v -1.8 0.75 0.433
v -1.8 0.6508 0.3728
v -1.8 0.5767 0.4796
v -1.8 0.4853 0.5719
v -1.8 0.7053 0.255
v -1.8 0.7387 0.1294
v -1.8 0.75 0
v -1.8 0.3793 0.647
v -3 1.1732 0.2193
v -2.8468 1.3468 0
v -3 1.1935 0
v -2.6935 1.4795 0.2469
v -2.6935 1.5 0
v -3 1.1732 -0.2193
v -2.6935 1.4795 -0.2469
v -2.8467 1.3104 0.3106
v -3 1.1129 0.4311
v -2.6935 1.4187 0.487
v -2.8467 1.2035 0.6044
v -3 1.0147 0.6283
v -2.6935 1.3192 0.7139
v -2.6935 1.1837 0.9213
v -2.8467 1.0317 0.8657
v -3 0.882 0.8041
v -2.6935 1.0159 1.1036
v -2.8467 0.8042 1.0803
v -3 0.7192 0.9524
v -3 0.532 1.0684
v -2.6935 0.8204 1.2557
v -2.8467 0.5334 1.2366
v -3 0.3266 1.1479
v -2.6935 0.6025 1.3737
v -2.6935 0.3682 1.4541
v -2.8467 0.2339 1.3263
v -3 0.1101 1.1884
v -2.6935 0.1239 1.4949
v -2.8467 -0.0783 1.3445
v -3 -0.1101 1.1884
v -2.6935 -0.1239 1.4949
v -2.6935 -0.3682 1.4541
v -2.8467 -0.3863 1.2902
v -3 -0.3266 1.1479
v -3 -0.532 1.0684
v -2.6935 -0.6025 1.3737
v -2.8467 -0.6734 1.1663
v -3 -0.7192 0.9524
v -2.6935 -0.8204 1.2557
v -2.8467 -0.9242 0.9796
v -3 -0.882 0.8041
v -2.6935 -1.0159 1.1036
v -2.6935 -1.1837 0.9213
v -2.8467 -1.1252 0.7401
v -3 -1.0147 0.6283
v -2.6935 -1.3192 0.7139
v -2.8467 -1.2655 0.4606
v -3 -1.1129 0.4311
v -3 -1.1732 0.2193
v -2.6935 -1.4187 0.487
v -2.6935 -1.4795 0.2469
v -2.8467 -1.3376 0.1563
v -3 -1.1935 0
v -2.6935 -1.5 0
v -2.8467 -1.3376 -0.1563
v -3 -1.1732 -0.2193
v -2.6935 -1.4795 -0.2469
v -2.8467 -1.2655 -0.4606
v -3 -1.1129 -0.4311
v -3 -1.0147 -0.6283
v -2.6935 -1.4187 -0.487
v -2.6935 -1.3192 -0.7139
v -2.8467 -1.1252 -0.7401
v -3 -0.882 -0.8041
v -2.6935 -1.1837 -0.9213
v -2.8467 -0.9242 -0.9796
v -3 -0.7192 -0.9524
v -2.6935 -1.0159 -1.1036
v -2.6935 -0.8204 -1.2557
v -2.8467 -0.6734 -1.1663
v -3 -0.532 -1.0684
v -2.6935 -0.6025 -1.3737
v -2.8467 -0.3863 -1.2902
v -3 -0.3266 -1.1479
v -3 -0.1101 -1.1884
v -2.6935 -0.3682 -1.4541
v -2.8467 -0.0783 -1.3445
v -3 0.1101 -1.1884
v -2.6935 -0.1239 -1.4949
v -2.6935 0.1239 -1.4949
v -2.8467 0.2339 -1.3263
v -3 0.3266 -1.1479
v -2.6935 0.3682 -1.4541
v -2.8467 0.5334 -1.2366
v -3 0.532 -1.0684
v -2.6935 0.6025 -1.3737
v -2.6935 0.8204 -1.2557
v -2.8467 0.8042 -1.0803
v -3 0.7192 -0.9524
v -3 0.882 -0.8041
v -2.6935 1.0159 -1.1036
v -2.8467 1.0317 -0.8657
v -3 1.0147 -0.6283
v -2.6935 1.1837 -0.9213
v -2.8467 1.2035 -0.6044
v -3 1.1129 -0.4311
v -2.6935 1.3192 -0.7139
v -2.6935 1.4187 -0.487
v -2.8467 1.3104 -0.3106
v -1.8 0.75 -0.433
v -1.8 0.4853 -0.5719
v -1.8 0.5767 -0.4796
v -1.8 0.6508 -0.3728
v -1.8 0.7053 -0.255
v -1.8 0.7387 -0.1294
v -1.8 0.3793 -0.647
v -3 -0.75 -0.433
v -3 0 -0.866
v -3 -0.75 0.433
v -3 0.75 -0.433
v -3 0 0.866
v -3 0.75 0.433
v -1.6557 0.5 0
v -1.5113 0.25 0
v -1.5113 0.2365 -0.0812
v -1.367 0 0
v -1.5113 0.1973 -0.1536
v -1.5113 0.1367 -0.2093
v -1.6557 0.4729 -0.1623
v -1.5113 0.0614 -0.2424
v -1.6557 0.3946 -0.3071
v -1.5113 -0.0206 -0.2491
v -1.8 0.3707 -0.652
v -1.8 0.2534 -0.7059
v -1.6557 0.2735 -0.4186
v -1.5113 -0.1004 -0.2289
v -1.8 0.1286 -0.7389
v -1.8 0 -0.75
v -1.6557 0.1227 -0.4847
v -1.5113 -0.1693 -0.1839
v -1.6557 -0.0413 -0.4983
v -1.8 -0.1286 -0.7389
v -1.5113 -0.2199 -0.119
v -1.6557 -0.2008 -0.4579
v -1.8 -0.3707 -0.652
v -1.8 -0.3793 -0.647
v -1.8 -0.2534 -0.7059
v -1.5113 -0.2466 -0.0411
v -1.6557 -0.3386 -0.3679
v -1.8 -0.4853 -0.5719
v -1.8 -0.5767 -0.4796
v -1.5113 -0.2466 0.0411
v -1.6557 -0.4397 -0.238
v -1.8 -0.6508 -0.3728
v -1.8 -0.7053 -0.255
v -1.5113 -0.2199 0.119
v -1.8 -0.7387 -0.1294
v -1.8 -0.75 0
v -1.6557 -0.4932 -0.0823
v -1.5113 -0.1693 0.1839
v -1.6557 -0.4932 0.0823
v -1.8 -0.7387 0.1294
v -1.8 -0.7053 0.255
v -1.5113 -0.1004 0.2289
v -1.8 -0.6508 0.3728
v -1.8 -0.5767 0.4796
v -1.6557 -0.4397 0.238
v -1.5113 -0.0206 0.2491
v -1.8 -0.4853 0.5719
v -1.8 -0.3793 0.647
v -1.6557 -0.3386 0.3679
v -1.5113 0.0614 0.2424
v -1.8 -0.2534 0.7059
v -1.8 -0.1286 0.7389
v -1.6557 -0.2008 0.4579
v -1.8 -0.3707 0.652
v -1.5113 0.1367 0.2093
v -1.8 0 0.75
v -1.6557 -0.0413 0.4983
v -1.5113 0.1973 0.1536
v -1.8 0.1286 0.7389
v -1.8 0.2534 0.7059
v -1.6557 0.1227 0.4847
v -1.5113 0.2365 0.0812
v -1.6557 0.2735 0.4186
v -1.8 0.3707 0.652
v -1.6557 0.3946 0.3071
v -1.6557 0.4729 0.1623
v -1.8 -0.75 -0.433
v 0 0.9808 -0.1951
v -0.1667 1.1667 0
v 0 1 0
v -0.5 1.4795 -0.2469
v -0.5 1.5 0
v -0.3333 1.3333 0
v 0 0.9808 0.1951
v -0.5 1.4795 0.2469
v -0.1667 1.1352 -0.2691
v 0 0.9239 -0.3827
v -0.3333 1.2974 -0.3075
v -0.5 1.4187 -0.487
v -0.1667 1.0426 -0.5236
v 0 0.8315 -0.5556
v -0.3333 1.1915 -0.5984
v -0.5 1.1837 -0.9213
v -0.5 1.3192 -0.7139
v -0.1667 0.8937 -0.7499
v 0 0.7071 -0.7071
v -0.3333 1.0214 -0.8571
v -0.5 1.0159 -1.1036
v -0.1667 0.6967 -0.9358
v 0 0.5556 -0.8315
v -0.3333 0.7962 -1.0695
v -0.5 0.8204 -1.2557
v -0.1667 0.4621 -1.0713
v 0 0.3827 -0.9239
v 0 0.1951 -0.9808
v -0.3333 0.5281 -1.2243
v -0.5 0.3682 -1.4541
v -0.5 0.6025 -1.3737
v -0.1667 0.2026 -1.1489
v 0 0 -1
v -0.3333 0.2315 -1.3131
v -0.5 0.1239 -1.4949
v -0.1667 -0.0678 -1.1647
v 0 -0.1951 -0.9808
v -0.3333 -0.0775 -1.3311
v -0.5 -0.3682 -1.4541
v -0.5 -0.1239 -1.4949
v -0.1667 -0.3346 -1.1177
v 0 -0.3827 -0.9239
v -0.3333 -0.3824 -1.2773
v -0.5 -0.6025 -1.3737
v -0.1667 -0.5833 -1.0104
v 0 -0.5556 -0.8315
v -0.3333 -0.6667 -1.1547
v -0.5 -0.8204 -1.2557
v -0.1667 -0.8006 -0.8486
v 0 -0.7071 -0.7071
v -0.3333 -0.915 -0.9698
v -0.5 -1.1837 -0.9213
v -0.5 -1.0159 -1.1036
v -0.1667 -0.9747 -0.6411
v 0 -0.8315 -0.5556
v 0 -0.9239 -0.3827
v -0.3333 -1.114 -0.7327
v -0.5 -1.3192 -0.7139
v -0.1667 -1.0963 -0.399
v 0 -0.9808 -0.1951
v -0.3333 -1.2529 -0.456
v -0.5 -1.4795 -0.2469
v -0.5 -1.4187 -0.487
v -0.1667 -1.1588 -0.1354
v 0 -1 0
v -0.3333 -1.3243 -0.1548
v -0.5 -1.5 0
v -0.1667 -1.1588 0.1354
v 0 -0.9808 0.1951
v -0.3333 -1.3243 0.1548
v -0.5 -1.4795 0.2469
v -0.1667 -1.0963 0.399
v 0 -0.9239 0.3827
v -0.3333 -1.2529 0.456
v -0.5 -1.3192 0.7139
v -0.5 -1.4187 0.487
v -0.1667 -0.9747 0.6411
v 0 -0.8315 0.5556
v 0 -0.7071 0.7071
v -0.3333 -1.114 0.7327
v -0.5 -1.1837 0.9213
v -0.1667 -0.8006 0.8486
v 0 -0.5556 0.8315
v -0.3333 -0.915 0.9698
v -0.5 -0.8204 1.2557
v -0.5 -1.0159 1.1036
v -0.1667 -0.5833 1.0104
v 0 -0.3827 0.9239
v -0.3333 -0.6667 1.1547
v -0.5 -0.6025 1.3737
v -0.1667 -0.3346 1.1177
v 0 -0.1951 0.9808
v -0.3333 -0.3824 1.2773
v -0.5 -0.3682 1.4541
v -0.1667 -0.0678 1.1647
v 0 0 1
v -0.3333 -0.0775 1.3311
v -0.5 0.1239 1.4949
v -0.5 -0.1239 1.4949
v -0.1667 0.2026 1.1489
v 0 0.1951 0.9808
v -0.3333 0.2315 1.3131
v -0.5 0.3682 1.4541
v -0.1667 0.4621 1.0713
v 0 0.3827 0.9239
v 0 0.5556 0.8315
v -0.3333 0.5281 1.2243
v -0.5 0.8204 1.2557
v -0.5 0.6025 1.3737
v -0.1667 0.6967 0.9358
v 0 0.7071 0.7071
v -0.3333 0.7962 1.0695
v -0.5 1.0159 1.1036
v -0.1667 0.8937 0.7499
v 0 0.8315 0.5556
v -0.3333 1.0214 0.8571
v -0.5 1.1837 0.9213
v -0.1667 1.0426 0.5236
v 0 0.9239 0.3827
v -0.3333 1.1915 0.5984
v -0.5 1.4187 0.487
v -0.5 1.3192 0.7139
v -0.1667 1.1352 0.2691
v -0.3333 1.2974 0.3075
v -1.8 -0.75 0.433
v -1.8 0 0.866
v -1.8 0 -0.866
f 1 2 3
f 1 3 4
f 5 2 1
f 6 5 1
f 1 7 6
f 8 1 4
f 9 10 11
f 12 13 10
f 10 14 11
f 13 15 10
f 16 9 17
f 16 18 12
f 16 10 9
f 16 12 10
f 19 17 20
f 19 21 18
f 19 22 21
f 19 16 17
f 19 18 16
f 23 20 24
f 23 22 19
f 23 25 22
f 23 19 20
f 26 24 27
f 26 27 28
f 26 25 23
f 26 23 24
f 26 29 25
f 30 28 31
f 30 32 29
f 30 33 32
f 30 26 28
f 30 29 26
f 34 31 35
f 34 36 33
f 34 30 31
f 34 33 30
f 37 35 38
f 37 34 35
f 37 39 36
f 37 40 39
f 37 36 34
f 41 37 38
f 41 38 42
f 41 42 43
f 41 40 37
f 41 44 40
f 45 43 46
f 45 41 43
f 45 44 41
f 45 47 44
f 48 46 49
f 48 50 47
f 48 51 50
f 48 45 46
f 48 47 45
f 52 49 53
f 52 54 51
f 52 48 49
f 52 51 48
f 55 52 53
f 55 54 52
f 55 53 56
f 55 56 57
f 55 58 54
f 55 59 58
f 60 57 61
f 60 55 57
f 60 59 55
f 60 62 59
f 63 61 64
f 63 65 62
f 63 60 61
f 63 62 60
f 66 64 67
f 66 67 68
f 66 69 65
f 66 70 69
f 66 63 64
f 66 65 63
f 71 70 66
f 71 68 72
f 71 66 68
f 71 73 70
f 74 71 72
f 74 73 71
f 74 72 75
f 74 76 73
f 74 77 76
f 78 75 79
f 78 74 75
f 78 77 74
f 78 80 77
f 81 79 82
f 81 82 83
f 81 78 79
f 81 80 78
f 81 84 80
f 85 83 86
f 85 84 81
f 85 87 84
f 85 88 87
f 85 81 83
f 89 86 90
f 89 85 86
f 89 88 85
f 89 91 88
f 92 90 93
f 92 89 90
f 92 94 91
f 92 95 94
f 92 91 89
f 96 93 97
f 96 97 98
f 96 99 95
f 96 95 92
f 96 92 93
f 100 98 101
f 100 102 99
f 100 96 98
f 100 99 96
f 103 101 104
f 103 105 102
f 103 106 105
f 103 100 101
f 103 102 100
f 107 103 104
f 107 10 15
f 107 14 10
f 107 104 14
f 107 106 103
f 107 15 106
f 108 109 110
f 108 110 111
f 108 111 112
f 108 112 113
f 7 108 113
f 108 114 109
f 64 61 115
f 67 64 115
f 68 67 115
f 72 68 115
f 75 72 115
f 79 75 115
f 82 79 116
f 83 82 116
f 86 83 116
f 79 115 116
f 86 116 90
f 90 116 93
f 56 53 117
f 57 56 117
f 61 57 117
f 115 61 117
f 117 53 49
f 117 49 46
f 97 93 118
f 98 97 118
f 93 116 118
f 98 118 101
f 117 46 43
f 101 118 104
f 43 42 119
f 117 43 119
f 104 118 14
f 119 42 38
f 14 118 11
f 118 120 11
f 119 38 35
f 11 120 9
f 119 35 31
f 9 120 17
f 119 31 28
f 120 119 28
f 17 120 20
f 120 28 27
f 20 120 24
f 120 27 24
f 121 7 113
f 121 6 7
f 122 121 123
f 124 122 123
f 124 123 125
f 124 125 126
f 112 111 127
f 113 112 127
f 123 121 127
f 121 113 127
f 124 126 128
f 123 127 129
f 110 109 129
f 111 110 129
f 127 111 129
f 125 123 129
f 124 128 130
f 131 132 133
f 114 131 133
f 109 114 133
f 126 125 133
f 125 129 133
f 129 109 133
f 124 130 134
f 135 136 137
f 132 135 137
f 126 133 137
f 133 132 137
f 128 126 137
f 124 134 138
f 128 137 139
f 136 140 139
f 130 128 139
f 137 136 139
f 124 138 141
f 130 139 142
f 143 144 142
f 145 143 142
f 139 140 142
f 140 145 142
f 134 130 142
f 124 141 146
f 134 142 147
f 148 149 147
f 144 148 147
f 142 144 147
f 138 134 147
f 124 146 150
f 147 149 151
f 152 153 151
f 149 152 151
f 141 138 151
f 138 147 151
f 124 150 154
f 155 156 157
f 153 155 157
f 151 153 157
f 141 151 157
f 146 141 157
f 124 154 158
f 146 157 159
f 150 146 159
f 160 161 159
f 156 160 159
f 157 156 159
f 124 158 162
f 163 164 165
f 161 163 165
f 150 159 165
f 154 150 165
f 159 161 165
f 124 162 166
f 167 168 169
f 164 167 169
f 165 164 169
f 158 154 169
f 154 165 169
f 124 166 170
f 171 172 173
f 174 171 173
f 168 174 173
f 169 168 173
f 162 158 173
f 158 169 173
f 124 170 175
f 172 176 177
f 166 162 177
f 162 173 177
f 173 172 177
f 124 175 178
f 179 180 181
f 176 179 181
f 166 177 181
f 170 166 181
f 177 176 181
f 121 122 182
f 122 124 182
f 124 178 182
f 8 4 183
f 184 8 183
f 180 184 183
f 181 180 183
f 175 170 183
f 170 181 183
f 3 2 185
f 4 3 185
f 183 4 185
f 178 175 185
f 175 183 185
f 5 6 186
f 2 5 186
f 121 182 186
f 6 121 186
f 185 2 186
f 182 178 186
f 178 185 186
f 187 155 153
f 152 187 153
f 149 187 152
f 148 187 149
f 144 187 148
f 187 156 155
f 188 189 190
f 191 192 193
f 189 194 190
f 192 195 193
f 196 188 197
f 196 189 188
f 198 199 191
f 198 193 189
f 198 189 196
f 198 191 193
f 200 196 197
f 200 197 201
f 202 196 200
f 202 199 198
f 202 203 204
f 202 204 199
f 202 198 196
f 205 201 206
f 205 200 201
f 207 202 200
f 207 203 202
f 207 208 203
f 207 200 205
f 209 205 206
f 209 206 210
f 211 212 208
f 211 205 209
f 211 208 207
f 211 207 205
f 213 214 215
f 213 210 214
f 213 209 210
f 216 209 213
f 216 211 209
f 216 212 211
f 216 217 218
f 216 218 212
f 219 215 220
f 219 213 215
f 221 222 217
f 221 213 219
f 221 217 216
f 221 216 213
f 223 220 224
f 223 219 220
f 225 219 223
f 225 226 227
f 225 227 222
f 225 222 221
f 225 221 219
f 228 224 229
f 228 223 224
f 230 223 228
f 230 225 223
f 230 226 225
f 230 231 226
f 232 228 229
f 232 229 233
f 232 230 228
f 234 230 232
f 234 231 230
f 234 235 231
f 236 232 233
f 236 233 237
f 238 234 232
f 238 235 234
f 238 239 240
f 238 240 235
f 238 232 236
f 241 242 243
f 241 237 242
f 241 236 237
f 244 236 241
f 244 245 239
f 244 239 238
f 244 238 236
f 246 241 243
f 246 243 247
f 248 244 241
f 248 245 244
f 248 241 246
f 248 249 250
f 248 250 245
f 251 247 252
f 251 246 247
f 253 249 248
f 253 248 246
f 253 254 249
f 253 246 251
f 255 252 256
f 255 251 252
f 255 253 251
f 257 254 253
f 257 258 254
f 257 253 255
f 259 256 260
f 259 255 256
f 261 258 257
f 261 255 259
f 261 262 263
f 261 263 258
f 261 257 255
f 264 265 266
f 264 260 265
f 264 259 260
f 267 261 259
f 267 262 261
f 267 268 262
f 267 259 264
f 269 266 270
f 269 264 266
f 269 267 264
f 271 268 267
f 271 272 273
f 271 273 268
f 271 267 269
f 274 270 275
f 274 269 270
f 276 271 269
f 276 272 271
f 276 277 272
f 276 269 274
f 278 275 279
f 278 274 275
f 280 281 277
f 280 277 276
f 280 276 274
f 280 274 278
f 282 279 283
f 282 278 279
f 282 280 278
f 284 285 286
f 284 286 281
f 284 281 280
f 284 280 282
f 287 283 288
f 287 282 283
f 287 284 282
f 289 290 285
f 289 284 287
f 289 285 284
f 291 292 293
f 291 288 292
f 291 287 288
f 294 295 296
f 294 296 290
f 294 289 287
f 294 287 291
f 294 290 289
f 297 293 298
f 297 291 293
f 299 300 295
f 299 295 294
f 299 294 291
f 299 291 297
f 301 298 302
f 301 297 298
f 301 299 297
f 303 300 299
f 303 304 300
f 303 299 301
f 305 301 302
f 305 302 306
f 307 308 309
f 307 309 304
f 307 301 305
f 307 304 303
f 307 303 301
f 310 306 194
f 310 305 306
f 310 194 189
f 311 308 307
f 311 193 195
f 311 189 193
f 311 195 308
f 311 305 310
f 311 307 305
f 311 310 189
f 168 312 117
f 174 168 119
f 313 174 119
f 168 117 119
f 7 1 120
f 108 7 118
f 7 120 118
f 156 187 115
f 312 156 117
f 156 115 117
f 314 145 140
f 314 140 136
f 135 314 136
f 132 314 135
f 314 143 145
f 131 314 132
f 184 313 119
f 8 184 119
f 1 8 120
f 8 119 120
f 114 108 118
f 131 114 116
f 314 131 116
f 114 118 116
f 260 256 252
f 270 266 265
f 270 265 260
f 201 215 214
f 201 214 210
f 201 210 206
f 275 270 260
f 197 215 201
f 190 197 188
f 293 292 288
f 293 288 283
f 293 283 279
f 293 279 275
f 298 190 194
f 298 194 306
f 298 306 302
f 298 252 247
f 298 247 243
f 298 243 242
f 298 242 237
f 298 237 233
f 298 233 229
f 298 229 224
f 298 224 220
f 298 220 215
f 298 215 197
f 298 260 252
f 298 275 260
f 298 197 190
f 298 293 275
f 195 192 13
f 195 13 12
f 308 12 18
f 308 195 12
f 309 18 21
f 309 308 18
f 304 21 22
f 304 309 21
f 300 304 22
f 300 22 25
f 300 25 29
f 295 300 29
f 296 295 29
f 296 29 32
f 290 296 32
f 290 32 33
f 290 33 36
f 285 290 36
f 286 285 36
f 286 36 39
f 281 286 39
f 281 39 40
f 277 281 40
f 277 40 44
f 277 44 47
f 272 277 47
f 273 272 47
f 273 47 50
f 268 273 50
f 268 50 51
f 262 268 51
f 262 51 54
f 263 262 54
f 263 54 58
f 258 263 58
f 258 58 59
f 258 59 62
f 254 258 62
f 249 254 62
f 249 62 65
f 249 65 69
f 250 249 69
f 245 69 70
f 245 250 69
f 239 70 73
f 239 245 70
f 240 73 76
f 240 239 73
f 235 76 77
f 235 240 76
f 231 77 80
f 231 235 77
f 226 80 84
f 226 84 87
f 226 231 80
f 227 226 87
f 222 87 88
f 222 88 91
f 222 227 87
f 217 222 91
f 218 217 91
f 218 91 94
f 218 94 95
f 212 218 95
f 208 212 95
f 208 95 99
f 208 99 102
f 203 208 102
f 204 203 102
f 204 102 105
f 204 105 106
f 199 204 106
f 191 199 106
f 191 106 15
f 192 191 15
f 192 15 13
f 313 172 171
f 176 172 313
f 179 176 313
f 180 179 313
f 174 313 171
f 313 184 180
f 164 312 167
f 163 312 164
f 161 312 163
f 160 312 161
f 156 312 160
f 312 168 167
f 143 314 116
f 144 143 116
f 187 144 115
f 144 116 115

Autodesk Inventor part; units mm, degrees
sketch "Sketch_1" plane through (0, 0, 0) normal (0, 0, 1) x (1, 0, 0)
  line L0 (0, 0) -> (-3, 0)
  line L1 (-3, 0) -> (-3, 1.1935)
  line L2 (-3, 1.1935) -> (-2.6935, 1.5)
  line L3 (-2.6935, 1.5) -> (-0.5, 1.5)
  line L4 (-0.5, 1.5) -> (0, 1)
  line L5 (0, 1) -> (0, 0)
  line L6 (0, 0) -> (-3, 0)
revolve "Revolution1" add sketch "Sketch_1" angle 360 about axis through (0, 0, 0) along (1, 0, 0)
thread "Thread1" size "M3x0.5" class "6g" standard "ISO Metric profile" full length
sketch "Sketch_2" plane through (-3, 0, 0) normal (-1, 0, 0) x (0, 1, 0)
  line L0 (-0.75, -0.433) -> (0, -0.866)
  line L1 (0, -0.866) -> (0.75, -0.433)
  line L2 (0.75, -0.433) -> (0.75, 0.433)
  line L3 (0.75, 0.433) -> (0, 0.866)
  line L4 (0, 0.866) -> (-0.75, 0.433)
  line L5 (-0.75, 0.433) -> (-0.75, -0.433)
extrude "Extrusion1" cut sketch "Sketch_2" against normal blind 1.2
sketch "Sketch_3" plane through (0, 0, 0) normal (0, 0, 1) x (1, 0, 0)
  line L0 (-1.367, 0) -> (-1.8, 0)
  line L1 (-1.8, 0) -> (-1.8, 0.75)
  line L2 (-1.8, 0.75) -> (-1.367, 0)
  line L3 (-1.367, 0) -> (-1.8, 0)
revolve "Revolution2" cut sketch "Sketch_3" angle 360 about axis through (-1.367, 0, 0) along (1, 0, 0)
ref_plane "CP_XY" through (0, 0, 0) normal (1, 0, 0) x (0, 0, -1)
ref_plane "CP_YZ" through (0, 0, 0) normal (0, 0, -1) x (0, 1, 0)
ref_plane "CP_ZX" through (0, 0, 0) normal (0, 1, 0) x (1, 0, 0)
properties part number "SET-SCREW3-3"
